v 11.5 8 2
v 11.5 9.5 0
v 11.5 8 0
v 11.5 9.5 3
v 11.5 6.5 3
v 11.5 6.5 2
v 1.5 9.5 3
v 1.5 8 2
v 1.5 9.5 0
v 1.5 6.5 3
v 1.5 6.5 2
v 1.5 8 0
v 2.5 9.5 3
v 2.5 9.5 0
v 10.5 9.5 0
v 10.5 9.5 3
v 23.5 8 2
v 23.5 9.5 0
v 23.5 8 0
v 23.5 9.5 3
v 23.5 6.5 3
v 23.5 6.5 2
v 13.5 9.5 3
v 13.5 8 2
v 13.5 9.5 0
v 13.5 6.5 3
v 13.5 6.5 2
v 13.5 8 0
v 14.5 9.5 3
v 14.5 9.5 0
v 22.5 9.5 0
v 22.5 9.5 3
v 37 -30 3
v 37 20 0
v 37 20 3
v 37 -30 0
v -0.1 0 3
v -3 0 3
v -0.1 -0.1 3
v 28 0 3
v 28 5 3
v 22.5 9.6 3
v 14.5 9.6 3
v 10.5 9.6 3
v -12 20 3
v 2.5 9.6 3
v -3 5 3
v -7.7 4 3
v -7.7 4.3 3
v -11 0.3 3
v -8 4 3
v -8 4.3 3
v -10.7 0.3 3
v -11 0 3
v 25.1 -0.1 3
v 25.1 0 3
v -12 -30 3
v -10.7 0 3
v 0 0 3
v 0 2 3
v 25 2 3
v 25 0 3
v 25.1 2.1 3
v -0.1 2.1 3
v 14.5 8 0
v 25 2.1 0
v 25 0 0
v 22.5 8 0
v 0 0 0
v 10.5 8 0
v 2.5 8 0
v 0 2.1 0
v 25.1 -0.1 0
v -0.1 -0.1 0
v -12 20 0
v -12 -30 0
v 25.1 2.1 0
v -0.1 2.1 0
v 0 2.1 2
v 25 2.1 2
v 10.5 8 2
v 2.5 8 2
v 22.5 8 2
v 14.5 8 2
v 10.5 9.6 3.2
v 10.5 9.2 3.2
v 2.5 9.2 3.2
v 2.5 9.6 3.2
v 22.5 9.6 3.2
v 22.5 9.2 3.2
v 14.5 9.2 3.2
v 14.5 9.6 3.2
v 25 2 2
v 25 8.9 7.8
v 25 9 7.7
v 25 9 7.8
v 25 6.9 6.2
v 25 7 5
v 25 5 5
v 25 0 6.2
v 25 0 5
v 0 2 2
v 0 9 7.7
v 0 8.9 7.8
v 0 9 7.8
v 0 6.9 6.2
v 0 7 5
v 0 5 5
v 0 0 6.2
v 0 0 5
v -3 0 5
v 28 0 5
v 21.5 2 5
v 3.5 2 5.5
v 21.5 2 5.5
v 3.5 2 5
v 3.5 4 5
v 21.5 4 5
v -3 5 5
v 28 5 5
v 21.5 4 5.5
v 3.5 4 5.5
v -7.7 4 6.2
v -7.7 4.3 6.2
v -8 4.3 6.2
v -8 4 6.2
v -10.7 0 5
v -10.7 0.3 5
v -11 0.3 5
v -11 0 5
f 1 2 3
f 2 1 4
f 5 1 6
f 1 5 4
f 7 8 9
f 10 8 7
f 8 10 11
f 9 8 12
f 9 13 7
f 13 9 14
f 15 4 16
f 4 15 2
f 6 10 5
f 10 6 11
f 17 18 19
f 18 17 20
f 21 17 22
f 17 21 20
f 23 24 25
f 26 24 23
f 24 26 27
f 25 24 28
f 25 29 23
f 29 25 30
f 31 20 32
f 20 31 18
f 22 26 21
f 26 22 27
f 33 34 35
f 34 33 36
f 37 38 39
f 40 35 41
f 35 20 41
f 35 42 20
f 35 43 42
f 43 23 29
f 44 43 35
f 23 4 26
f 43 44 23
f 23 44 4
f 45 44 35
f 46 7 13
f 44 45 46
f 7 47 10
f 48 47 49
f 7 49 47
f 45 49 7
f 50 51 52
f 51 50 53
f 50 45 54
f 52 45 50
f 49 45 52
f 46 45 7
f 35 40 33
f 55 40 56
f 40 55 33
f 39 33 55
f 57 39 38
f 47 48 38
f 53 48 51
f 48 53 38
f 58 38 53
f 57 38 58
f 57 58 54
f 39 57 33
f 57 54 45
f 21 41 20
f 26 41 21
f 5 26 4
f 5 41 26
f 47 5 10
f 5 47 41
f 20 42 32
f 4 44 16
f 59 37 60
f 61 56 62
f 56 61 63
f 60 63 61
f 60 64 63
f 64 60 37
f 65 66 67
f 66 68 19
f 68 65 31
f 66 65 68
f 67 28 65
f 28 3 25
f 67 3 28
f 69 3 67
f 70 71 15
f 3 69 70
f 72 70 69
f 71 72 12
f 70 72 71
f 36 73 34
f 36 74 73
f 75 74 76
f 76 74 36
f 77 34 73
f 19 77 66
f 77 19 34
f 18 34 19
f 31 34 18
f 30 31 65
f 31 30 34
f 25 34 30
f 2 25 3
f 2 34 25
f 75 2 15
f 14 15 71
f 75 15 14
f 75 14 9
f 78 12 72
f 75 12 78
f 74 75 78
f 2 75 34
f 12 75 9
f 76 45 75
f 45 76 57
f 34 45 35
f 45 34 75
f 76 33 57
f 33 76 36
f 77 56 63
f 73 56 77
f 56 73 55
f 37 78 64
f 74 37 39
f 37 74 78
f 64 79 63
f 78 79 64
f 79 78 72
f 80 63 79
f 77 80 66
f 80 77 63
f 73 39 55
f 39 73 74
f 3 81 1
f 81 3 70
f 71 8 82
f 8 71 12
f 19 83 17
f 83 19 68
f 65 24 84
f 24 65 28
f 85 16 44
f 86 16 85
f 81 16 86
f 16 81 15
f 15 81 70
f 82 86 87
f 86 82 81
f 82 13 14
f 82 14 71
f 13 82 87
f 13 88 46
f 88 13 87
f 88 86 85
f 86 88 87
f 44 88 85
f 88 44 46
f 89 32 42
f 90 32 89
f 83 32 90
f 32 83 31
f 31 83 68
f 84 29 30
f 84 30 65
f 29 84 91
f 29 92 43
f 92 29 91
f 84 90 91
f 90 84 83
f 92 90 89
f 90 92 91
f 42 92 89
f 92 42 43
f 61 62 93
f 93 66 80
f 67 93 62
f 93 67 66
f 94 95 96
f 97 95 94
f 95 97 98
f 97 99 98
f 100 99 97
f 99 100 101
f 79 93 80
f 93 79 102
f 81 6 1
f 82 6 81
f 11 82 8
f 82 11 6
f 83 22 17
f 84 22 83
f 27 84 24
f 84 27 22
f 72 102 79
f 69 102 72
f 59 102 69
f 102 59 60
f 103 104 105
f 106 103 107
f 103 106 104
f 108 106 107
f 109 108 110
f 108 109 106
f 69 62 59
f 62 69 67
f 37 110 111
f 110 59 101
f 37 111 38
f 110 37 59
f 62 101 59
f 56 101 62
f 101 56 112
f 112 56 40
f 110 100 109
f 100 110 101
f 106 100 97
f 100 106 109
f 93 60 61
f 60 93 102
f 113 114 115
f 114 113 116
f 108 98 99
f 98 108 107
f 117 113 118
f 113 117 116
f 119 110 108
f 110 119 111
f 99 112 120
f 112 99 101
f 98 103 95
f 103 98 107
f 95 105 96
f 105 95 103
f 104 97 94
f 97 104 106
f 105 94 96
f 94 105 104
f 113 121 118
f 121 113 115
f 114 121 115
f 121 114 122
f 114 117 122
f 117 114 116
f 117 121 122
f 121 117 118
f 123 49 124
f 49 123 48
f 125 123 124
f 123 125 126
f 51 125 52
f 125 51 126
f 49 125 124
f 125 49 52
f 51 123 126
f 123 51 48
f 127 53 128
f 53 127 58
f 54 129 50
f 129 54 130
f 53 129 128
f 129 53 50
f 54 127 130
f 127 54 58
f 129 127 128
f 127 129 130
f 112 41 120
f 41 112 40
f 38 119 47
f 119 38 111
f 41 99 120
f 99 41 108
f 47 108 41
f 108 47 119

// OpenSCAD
// ============================================================
// TESTE DE MONTAGEM — CLIP HEPA + MDF + FILTRO
// Abra no OpenSCAD → F5 (preview) → gire com mouse
// ============================================================
// MUDE 'vista' PARA TESTAR:
//   1 = Montado, 2 = Explodido, 3 = Corte, 4 = Animação
// ============================================================

vista = 1;        // [1:Montado, 2:Explodido, 3:Corte, 4:Animação]
explode = 12;

// === PARÂMETROS DO CLIP HEPA ===
mdf = 3;
hepa_borda_esp = 2;
hepa_borda_larg = 5;
clip_larg = 25;
clip_parede = 2;
aba_comp = 7;
aba_esp = 1.2;
base_prof = 8;
dente_h = 1.2;
dente_w = 8;
dente_pos = 6;
slot_w = 10;
slot_prof = 2;

module clip_hepa() {
    difference() {
        union() {
            // Base
            cube([clip_larg, base_prof, clip_parede]);
            // Parede
            cube([clip_larg, clip_parede, mdf + hepa_borda_esp + aba_esp]);
            // Aba
            translate([0, 0, mdf + hepa_borda_esp])
                cube([clip_larg, aba_comp, aba_esp]);
            // Rampa
            translate([0, aba_comp - 0.1, mdf + hepa_borda_esp])
                hull() {
                    cube([clip_larg, 0.1, aba_esp]);
                    translate([0, 2, aba_esp + 1.5])
                        cube([clip_larg, 0.1, 0.1]);
                }
            // Dentes
            for (dx = [clip_larg/2 - dente_pos - dente_w/2,
                       clip_larg/2 + dente_pos - dente_w/2])
                translate([dx, base_prof, 0]) {
                    hull() {
                        cube([dente_w, 0.1, clip_parede]);
                        translate([0, dente_h, 0])
                            cube([dente_w, 0.1, clip_parede + dente_h]);
                    }
                    translate([0, dente_h, 0])
                        cube([dente_w, 0.4, clip_parede + dente_h]);
                }
        }
        // Canal de flexão
        translate([clip_parede + 1.5, clip_parede, mdf + hepa_borda_esp - 0.1])
            cube([clip_larg - 2*clip_parede - 3, aba_comp - clip_parede - 3, 0.6]);
    }
}

module mdf_secao() {
    color("BurlyWood", 0.7)
    difference() {
        translate([-12, -30, 0])
            cube([clip_larg + 24, 50, mdf]);
        // Entalhe para parede do clip (25×2mm na borda do furo)
        translate([-0.1, -0.1, -0.1])
            cube([clip_larg + 0.2, clip_parede + 0.2, mdf + 0.2]);
        // Slots para dentes
        for (dx = [clip_larg/2 - dente_pos - slot_w/2,
                   clip_larg/2 + dente_pos - slot_w/2])
            translate([dx, base_prof - slot_prof + 0.5, -0.1])
                cube([slot_w, slot_prof + 1, mdf + 0.2]);
    }
}

module filtro_borda() {
    color("DodgerBlue", 0.5)
    translate([-3, 0, mdf])
        cube([clip_larg + 6, hepa_borda_larg, hepa_borda_esp]);
}

module cotas() {
    color("Red") {
        translate([-8, base_prof/2, 0])
            cube([0.3, 0.3, mdf + hepa_borda_esp + aba_esp]);
        translate([-11, 0, 0]) cube([0.3, 0.3, mdf]);
        translate([-11, 0, mdf]) cube([0.3, 0.3, hepa_borda_esp]);
    }
    color("White") {
        translate([-20, -5, mdf/2])
            rotate([90,0,0]) text("MDF 3mm", size=1.5);
        translate([-25, -5, mdf + hepa_borda_esp/2])
            rotate([90,0,0]) text("Borda 2mm", size=1.5);
        translate([-20, -5, mdf + hepa_borda_esp + aba_esp/2])
            rotate([90,0,0]) text("Aba 7mm", size=1.5);
    }
}

// === VISTAS ===
if (vista == 1) {
    echo("=== HEPA: VERIFICAR ===");
    echo("1. Aba curta (7mm) cobre a borda de 5mm?");
    echo("2. Vedação suficiente ao redor?");
    echo("3. Furo pequeno (100x130mm) centralizado?");
    mdf_secao(); filtro_borda();
    color("Orange") clip_hepa();
    cotas();
}
if (vista == 2) {
    translate([0,0,-explode]) mdf_secao();
    filtro_borda();
    translate([0,0,explode]) color("Orange") clip_hepa();
}
if (vista == 3) {
    difference() {
        union() { mdf_secao(); filtro_borda(); color("Orange") clip_hepa(); }
        translate([clip_larg/2, -40, -10])
            cube([clip_larg+20, 100, 40]);
    }
    cotas();
}
if (vista == 4) {
    mdf_secao(); filtro_borda();
    color("Orange") translate([0,0,20*(1-$t)]) clip_hepa();
}
